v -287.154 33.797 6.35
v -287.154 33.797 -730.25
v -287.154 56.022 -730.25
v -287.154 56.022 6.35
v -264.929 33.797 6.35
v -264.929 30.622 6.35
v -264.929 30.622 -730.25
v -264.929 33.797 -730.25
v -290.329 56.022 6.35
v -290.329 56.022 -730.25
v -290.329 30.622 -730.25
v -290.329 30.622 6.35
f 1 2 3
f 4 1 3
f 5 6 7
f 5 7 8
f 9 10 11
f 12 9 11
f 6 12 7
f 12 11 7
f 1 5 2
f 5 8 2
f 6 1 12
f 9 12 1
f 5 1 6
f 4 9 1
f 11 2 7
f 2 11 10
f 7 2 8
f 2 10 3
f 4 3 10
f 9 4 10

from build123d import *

# Parameters (mm, degrees)
F1_DEPTH = 730.25
F2_DEPTH = 6.35


with BuildPart() as f1:
    # F0 (on Top) → F1 (new body)
    with BuildSketch(Plane.XY):
        Polygon((-290.32869, 56.021555), (-290.32869, 30.621555), (-264.92869, 30.621555), (-264.92869, 33.796555), (-287.15369, 33.796555), (-287.15369, 56.021555), align=None)
    extrude(amount=-F1_DEPTH)

    # F1_face (on face) → F2 (join)
    with BuildSketch(Plane(origin=(-282.814523, 38.135722, 0), x_dir=(1, 0, 0), z_dir=(0, 0, 1))):
        Polygon((-7.514167, 17.885833), (-7.514167, -7.514167), (17.885833, -7.514167), (17.885833, -4.339167), (-4.339167, -4.339167), (-4.339167, 17.885833), align=None)
    extrude(amount=F2_DEPTH)


solid = f1.part
